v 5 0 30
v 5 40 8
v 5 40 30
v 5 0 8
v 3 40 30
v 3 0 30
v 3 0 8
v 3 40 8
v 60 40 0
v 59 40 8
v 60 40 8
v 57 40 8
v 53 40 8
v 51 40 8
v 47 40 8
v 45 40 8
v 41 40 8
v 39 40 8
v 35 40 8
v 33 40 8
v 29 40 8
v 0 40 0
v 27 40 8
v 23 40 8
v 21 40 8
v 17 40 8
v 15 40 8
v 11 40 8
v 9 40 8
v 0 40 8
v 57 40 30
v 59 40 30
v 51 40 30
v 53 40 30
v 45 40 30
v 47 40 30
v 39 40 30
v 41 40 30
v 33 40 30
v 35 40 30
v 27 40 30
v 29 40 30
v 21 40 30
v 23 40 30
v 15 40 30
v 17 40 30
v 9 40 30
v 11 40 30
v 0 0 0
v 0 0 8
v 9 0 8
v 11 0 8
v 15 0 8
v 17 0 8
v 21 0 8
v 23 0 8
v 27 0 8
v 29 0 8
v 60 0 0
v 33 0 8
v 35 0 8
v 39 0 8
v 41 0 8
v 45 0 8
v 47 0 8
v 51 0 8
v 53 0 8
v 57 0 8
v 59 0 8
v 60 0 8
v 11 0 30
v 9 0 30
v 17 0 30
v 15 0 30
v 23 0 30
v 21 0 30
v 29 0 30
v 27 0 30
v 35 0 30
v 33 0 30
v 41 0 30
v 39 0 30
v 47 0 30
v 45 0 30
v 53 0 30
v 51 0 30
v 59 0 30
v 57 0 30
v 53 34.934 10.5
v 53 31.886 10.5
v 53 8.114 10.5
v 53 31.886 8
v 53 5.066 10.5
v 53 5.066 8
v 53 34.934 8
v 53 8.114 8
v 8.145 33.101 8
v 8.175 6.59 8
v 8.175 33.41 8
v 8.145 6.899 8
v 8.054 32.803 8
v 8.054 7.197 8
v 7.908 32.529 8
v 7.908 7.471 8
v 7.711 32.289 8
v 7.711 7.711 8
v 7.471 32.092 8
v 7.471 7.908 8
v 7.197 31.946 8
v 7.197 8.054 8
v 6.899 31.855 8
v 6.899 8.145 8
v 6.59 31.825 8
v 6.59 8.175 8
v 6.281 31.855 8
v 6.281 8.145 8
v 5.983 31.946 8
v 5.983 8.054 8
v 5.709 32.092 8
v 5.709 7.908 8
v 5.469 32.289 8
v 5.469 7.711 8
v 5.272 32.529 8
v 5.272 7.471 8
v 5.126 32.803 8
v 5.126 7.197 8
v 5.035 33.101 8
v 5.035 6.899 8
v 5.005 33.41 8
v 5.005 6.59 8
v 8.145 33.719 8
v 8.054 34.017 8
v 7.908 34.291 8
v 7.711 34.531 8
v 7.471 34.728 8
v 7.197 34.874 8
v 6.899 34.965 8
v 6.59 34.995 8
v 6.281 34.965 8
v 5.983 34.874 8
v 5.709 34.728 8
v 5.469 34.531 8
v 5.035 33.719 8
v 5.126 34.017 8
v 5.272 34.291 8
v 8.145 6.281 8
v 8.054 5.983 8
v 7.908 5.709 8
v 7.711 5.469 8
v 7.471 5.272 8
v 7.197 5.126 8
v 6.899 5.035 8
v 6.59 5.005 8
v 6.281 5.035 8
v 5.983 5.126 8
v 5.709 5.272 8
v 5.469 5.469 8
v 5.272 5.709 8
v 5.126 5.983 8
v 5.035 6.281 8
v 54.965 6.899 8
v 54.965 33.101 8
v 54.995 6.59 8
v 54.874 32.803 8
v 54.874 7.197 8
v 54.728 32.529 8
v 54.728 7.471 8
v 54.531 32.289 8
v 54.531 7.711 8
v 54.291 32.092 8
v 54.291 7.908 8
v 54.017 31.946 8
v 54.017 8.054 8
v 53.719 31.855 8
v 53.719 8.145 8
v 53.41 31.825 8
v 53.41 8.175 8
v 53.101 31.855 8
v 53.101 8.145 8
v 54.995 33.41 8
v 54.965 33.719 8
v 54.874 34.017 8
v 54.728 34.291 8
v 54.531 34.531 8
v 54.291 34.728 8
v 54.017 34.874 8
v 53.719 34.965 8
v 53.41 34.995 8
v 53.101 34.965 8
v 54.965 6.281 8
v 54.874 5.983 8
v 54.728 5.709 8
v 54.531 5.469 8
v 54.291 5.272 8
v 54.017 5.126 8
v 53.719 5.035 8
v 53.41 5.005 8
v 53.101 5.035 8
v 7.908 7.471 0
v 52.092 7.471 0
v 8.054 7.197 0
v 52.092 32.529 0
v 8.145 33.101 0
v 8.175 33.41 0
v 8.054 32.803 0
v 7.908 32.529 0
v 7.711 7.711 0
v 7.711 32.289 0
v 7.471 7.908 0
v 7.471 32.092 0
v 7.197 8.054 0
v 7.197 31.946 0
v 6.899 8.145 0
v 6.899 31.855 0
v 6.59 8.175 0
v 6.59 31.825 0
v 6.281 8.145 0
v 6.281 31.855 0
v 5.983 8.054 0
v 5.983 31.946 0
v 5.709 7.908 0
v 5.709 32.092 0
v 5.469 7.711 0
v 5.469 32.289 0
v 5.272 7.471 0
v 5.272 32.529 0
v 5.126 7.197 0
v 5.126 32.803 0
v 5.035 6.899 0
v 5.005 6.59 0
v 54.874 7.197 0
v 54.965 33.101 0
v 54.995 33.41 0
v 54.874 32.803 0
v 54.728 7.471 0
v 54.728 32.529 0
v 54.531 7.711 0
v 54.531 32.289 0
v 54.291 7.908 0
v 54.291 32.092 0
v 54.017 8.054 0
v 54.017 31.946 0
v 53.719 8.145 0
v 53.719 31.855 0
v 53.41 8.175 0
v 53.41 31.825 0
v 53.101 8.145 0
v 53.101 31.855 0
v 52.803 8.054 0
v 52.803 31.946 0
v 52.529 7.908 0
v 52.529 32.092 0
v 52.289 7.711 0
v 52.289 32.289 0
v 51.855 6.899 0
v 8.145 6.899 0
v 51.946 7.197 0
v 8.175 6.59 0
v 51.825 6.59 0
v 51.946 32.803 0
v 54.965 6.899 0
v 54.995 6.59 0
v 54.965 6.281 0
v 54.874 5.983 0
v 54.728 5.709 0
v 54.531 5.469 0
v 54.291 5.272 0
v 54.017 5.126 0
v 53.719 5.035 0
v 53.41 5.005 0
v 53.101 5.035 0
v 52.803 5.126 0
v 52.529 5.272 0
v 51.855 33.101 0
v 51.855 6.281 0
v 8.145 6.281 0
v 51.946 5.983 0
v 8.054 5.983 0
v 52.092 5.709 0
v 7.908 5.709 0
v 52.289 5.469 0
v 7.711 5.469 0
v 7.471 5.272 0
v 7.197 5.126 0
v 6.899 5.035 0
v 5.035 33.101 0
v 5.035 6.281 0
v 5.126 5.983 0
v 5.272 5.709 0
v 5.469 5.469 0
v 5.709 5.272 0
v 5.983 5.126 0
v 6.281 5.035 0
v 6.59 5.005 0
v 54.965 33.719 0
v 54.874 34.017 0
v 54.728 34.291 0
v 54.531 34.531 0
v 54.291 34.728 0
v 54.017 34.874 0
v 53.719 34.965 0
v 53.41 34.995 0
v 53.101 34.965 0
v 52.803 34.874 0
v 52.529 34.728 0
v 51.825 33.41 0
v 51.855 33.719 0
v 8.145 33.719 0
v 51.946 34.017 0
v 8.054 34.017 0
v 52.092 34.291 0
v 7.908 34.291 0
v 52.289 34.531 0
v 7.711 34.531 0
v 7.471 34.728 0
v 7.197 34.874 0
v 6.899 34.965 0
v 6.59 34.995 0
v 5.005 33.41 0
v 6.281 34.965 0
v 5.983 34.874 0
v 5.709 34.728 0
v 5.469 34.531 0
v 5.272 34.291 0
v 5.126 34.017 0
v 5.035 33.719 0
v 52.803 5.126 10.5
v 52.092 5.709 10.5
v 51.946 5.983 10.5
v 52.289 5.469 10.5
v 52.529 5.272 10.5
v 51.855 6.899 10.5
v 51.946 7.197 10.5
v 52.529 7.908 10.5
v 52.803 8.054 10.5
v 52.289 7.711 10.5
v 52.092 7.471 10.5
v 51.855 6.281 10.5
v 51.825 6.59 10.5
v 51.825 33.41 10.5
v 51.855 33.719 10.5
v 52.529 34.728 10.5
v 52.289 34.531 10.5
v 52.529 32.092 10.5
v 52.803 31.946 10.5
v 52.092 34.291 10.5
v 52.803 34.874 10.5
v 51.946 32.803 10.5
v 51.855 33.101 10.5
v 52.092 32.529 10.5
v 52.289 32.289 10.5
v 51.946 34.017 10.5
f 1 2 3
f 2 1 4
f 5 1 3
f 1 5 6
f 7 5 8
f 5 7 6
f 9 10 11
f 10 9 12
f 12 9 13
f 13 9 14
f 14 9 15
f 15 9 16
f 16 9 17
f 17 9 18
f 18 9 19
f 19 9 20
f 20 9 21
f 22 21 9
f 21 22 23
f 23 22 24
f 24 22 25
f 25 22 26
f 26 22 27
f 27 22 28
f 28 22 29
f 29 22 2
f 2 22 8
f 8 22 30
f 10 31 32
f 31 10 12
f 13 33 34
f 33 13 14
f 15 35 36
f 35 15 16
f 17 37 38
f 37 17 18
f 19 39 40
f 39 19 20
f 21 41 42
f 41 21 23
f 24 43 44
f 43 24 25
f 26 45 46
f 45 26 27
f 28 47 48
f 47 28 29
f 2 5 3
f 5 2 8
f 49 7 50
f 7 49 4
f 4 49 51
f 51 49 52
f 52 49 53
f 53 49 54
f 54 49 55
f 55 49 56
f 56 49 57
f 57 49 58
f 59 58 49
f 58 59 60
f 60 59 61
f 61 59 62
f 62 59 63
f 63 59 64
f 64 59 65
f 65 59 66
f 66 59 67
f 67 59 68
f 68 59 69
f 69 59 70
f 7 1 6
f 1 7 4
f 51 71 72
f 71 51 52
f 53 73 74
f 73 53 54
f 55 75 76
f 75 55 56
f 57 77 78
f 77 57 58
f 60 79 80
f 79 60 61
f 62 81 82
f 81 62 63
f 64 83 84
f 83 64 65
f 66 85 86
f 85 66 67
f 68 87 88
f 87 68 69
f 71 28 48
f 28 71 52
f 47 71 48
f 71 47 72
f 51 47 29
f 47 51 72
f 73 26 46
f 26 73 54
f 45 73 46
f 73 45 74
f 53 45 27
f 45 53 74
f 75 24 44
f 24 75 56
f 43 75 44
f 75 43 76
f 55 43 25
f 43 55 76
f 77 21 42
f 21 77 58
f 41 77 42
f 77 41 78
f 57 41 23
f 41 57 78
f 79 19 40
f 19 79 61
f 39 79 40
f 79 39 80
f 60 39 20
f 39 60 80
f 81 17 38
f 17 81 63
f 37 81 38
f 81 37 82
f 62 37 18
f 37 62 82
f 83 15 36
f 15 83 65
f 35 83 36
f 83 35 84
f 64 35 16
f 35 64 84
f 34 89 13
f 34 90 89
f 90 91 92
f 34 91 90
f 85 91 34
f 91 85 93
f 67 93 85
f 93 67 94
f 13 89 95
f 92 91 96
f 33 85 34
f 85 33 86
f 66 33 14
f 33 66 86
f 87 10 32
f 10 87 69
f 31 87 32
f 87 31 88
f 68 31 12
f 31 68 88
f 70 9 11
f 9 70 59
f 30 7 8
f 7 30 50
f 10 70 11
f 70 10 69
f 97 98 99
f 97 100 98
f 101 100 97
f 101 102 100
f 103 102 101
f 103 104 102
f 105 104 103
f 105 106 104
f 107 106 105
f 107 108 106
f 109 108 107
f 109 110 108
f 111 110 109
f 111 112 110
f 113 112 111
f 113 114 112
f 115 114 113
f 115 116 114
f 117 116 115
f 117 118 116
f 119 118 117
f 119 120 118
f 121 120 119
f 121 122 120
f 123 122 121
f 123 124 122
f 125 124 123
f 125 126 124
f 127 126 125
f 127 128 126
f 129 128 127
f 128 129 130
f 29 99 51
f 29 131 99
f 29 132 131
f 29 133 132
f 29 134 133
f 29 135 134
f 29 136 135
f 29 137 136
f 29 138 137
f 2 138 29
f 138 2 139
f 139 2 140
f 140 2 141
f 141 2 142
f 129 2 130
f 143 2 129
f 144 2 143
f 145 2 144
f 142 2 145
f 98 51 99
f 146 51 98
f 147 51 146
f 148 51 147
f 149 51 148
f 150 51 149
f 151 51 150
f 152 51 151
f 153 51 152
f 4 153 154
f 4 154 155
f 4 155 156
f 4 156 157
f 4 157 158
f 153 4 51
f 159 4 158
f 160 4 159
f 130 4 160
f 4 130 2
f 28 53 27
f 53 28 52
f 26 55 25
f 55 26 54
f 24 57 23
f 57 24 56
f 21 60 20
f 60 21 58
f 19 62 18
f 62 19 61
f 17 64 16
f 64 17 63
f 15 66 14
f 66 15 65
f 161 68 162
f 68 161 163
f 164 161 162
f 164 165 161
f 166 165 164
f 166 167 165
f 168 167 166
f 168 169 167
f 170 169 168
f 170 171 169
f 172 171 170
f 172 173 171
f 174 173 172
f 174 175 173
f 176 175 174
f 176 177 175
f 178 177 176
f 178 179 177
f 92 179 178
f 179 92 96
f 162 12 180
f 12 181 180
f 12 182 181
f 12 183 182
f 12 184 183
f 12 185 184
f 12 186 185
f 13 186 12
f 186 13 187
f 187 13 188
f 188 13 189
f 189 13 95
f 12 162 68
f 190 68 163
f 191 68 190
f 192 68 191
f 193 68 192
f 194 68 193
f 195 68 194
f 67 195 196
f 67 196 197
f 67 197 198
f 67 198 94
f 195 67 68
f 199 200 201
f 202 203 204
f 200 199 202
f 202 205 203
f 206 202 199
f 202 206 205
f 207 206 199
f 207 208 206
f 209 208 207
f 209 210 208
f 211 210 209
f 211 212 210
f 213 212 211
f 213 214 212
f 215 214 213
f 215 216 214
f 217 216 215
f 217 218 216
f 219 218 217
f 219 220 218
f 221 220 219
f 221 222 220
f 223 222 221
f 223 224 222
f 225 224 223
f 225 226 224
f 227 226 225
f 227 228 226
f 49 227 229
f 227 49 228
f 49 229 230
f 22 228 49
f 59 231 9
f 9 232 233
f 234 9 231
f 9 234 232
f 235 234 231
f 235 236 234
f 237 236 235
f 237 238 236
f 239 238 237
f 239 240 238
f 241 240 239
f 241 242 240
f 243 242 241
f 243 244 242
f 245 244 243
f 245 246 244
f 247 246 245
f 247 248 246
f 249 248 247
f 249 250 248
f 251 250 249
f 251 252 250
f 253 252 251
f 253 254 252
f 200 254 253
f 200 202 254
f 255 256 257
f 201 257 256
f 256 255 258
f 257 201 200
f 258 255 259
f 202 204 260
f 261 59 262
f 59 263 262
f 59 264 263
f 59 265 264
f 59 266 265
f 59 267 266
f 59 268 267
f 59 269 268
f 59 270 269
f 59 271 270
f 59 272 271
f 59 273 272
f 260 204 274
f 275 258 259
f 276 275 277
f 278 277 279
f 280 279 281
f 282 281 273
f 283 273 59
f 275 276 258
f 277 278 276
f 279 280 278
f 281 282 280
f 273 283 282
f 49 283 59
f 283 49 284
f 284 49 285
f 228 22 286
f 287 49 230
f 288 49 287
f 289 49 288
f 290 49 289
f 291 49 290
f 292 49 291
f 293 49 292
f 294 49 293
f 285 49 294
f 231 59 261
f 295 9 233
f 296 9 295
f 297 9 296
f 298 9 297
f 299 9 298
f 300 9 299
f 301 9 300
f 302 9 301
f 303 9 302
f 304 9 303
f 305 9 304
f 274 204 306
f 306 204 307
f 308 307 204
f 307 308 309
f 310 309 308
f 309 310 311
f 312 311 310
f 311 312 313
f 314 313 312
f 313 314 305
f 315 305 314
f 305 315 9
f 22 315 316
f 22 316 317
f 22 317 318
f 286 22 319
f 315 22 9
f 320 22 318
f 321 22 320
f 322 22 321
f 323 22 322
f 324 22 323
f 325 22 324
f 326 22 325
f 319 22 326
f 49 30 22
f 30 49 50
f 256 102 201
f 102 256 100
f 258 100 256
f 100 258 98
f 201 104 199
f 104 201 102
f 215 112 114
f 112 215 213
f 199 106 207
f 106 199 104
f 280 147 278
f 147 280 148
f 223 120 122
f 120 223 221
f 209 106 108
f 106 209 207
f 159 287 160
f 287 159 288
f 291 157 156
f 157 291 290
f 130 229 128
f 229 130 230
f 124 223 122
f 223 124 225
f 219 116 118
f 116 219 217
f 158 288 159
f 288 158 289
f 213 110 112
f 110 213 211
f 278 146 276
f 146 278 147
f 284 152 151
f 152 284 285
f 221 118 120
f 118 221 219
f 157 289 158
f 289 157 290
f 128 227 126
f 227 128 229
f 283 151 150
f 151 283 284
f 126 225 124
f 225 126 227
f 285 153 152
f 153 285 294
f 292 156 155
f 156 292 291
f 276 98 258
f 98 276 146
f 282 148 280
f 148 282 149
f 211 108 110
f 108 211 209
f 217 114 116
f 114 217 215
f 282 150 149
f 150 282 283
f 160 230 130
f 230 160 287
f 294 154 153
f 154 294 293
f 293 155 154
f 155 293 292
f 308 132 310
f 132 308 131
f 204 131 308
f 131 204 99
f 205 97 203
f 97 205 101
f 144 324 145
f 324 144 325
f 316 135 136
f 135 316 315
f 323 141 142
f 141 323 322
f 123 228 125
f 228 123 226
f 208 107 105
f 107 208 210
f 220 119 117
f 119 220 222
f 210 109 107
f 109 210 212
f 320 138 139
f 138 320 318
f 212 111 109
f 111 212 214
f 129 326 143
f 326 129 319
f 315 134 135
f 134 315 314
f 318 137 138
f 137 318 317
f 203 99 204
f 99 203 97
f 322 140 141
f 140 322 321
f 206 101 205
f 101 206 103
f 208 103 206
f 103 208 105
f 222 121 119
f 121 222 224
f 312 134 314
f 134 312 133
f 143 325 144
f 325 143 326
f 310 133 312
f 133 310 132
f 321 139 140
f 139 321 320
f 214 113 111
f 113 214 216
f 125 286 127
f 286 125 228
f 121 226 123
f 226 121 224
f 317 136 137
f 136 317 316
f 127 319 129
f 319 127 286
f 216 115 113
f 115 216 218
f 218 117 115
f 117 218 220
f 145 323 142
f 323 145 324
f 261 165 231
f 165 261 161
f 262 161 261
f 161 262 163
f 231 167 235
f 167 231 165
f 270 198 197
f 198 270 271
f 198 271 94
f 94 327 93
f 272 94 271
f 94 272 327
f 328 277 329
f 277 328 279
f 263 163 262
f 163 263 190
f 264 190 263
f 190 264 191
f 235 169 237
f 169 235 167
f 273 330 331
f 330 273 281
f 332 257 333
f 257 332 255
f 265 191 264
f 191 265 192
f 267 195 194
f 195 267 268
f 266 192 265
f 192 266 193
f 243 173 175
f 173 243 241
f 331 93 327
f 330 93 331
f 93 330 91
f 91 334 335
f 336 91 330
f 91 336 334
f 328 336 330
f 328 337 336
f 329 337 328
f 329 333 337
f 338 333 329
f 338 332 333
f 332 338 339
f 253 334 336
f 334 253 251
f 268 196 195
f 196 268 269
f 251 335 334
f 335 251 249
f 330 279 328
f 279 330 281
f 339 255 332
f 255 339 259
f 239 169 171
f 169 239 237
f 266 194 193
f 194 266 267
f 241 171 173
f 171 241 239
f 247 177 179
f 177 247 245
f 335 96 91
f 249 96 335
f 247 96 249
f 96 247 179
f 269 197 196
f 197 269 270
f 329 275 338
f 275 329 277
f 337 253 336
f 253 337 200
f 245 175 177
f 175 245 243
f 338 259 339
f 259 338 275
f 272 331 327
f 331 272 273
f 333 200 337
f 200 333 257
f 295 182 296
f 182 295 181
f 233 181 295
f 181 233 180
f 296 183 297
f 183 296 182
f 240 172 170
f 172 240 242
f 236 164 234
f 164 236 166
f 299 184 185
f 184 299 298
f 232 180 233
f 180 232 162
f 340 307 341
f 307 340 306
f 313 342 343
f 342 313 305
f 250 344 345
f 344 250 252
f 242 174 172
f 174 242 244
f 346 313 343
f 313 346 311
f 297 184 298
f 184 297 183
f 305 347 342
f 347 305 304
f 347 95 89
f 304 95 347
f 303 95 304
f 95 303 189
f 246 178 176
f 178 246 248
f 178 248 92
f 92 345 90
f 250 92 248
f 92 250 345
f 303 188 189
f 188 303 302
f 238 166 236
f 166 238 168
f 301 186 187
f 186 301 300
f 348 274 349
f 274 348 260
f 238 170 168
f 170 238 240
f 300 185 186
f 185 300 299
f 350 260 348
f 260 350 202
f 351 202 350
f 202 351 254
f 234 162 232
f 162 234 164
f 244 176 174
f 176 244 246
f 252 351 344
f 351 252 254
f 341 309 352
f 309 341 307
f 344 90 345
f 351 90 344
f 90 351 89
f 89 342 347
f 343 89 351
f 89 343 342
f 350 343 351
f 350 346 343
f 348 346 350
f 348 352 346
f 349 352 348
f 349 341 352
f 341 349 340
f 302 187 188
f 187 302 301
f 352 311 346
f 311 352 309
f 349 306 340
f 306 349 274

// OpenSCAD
$fn = 32;

// ----------------------------------------------------------------------
// Finned heat sink: 60 x 40 mm base, 22 mm fins
// ----------------------------------------------------------------------

// --- parameters (mm) ---
base_w = 60;              // base width
base_d = 40;              // base depth
base_t = 8;               // base thickness
fin_h = 22;               // fin height above the base
holes_d = 3.17;           // fixing holes
hole_x = 23.41;           // hole offset in x
hole_y = 13.41;           // hole offset in y
fin_t = 2;                // fin thickness
fin_pitch = 6;            // fin pitch
fin_count = 10;           // number of fins
fin_x0 = 3;               // first fin offset

difference() {
  union() {
    cube([base_w, base_d, base_t]);
    for (i = [0 : fin_count - 1]) {
      translate([fin_x0 + i * fin_pitch, 0, base_t - 0.5]) cube([fin_t, base_d, fin_h + 0.5]);
    }
  }
  /* fixing holes through the base, 2.5 mm clear on both sides */
  for (hx = [-23.41, 23.41]) {
    for (hy = [-13.41, 13.41]) {
      translate([base_w / 2 + hx, base_d / 2 + hy, -2.5]) cylinder(h = base_t + 5, d = holes_d);
    }
  }
}
